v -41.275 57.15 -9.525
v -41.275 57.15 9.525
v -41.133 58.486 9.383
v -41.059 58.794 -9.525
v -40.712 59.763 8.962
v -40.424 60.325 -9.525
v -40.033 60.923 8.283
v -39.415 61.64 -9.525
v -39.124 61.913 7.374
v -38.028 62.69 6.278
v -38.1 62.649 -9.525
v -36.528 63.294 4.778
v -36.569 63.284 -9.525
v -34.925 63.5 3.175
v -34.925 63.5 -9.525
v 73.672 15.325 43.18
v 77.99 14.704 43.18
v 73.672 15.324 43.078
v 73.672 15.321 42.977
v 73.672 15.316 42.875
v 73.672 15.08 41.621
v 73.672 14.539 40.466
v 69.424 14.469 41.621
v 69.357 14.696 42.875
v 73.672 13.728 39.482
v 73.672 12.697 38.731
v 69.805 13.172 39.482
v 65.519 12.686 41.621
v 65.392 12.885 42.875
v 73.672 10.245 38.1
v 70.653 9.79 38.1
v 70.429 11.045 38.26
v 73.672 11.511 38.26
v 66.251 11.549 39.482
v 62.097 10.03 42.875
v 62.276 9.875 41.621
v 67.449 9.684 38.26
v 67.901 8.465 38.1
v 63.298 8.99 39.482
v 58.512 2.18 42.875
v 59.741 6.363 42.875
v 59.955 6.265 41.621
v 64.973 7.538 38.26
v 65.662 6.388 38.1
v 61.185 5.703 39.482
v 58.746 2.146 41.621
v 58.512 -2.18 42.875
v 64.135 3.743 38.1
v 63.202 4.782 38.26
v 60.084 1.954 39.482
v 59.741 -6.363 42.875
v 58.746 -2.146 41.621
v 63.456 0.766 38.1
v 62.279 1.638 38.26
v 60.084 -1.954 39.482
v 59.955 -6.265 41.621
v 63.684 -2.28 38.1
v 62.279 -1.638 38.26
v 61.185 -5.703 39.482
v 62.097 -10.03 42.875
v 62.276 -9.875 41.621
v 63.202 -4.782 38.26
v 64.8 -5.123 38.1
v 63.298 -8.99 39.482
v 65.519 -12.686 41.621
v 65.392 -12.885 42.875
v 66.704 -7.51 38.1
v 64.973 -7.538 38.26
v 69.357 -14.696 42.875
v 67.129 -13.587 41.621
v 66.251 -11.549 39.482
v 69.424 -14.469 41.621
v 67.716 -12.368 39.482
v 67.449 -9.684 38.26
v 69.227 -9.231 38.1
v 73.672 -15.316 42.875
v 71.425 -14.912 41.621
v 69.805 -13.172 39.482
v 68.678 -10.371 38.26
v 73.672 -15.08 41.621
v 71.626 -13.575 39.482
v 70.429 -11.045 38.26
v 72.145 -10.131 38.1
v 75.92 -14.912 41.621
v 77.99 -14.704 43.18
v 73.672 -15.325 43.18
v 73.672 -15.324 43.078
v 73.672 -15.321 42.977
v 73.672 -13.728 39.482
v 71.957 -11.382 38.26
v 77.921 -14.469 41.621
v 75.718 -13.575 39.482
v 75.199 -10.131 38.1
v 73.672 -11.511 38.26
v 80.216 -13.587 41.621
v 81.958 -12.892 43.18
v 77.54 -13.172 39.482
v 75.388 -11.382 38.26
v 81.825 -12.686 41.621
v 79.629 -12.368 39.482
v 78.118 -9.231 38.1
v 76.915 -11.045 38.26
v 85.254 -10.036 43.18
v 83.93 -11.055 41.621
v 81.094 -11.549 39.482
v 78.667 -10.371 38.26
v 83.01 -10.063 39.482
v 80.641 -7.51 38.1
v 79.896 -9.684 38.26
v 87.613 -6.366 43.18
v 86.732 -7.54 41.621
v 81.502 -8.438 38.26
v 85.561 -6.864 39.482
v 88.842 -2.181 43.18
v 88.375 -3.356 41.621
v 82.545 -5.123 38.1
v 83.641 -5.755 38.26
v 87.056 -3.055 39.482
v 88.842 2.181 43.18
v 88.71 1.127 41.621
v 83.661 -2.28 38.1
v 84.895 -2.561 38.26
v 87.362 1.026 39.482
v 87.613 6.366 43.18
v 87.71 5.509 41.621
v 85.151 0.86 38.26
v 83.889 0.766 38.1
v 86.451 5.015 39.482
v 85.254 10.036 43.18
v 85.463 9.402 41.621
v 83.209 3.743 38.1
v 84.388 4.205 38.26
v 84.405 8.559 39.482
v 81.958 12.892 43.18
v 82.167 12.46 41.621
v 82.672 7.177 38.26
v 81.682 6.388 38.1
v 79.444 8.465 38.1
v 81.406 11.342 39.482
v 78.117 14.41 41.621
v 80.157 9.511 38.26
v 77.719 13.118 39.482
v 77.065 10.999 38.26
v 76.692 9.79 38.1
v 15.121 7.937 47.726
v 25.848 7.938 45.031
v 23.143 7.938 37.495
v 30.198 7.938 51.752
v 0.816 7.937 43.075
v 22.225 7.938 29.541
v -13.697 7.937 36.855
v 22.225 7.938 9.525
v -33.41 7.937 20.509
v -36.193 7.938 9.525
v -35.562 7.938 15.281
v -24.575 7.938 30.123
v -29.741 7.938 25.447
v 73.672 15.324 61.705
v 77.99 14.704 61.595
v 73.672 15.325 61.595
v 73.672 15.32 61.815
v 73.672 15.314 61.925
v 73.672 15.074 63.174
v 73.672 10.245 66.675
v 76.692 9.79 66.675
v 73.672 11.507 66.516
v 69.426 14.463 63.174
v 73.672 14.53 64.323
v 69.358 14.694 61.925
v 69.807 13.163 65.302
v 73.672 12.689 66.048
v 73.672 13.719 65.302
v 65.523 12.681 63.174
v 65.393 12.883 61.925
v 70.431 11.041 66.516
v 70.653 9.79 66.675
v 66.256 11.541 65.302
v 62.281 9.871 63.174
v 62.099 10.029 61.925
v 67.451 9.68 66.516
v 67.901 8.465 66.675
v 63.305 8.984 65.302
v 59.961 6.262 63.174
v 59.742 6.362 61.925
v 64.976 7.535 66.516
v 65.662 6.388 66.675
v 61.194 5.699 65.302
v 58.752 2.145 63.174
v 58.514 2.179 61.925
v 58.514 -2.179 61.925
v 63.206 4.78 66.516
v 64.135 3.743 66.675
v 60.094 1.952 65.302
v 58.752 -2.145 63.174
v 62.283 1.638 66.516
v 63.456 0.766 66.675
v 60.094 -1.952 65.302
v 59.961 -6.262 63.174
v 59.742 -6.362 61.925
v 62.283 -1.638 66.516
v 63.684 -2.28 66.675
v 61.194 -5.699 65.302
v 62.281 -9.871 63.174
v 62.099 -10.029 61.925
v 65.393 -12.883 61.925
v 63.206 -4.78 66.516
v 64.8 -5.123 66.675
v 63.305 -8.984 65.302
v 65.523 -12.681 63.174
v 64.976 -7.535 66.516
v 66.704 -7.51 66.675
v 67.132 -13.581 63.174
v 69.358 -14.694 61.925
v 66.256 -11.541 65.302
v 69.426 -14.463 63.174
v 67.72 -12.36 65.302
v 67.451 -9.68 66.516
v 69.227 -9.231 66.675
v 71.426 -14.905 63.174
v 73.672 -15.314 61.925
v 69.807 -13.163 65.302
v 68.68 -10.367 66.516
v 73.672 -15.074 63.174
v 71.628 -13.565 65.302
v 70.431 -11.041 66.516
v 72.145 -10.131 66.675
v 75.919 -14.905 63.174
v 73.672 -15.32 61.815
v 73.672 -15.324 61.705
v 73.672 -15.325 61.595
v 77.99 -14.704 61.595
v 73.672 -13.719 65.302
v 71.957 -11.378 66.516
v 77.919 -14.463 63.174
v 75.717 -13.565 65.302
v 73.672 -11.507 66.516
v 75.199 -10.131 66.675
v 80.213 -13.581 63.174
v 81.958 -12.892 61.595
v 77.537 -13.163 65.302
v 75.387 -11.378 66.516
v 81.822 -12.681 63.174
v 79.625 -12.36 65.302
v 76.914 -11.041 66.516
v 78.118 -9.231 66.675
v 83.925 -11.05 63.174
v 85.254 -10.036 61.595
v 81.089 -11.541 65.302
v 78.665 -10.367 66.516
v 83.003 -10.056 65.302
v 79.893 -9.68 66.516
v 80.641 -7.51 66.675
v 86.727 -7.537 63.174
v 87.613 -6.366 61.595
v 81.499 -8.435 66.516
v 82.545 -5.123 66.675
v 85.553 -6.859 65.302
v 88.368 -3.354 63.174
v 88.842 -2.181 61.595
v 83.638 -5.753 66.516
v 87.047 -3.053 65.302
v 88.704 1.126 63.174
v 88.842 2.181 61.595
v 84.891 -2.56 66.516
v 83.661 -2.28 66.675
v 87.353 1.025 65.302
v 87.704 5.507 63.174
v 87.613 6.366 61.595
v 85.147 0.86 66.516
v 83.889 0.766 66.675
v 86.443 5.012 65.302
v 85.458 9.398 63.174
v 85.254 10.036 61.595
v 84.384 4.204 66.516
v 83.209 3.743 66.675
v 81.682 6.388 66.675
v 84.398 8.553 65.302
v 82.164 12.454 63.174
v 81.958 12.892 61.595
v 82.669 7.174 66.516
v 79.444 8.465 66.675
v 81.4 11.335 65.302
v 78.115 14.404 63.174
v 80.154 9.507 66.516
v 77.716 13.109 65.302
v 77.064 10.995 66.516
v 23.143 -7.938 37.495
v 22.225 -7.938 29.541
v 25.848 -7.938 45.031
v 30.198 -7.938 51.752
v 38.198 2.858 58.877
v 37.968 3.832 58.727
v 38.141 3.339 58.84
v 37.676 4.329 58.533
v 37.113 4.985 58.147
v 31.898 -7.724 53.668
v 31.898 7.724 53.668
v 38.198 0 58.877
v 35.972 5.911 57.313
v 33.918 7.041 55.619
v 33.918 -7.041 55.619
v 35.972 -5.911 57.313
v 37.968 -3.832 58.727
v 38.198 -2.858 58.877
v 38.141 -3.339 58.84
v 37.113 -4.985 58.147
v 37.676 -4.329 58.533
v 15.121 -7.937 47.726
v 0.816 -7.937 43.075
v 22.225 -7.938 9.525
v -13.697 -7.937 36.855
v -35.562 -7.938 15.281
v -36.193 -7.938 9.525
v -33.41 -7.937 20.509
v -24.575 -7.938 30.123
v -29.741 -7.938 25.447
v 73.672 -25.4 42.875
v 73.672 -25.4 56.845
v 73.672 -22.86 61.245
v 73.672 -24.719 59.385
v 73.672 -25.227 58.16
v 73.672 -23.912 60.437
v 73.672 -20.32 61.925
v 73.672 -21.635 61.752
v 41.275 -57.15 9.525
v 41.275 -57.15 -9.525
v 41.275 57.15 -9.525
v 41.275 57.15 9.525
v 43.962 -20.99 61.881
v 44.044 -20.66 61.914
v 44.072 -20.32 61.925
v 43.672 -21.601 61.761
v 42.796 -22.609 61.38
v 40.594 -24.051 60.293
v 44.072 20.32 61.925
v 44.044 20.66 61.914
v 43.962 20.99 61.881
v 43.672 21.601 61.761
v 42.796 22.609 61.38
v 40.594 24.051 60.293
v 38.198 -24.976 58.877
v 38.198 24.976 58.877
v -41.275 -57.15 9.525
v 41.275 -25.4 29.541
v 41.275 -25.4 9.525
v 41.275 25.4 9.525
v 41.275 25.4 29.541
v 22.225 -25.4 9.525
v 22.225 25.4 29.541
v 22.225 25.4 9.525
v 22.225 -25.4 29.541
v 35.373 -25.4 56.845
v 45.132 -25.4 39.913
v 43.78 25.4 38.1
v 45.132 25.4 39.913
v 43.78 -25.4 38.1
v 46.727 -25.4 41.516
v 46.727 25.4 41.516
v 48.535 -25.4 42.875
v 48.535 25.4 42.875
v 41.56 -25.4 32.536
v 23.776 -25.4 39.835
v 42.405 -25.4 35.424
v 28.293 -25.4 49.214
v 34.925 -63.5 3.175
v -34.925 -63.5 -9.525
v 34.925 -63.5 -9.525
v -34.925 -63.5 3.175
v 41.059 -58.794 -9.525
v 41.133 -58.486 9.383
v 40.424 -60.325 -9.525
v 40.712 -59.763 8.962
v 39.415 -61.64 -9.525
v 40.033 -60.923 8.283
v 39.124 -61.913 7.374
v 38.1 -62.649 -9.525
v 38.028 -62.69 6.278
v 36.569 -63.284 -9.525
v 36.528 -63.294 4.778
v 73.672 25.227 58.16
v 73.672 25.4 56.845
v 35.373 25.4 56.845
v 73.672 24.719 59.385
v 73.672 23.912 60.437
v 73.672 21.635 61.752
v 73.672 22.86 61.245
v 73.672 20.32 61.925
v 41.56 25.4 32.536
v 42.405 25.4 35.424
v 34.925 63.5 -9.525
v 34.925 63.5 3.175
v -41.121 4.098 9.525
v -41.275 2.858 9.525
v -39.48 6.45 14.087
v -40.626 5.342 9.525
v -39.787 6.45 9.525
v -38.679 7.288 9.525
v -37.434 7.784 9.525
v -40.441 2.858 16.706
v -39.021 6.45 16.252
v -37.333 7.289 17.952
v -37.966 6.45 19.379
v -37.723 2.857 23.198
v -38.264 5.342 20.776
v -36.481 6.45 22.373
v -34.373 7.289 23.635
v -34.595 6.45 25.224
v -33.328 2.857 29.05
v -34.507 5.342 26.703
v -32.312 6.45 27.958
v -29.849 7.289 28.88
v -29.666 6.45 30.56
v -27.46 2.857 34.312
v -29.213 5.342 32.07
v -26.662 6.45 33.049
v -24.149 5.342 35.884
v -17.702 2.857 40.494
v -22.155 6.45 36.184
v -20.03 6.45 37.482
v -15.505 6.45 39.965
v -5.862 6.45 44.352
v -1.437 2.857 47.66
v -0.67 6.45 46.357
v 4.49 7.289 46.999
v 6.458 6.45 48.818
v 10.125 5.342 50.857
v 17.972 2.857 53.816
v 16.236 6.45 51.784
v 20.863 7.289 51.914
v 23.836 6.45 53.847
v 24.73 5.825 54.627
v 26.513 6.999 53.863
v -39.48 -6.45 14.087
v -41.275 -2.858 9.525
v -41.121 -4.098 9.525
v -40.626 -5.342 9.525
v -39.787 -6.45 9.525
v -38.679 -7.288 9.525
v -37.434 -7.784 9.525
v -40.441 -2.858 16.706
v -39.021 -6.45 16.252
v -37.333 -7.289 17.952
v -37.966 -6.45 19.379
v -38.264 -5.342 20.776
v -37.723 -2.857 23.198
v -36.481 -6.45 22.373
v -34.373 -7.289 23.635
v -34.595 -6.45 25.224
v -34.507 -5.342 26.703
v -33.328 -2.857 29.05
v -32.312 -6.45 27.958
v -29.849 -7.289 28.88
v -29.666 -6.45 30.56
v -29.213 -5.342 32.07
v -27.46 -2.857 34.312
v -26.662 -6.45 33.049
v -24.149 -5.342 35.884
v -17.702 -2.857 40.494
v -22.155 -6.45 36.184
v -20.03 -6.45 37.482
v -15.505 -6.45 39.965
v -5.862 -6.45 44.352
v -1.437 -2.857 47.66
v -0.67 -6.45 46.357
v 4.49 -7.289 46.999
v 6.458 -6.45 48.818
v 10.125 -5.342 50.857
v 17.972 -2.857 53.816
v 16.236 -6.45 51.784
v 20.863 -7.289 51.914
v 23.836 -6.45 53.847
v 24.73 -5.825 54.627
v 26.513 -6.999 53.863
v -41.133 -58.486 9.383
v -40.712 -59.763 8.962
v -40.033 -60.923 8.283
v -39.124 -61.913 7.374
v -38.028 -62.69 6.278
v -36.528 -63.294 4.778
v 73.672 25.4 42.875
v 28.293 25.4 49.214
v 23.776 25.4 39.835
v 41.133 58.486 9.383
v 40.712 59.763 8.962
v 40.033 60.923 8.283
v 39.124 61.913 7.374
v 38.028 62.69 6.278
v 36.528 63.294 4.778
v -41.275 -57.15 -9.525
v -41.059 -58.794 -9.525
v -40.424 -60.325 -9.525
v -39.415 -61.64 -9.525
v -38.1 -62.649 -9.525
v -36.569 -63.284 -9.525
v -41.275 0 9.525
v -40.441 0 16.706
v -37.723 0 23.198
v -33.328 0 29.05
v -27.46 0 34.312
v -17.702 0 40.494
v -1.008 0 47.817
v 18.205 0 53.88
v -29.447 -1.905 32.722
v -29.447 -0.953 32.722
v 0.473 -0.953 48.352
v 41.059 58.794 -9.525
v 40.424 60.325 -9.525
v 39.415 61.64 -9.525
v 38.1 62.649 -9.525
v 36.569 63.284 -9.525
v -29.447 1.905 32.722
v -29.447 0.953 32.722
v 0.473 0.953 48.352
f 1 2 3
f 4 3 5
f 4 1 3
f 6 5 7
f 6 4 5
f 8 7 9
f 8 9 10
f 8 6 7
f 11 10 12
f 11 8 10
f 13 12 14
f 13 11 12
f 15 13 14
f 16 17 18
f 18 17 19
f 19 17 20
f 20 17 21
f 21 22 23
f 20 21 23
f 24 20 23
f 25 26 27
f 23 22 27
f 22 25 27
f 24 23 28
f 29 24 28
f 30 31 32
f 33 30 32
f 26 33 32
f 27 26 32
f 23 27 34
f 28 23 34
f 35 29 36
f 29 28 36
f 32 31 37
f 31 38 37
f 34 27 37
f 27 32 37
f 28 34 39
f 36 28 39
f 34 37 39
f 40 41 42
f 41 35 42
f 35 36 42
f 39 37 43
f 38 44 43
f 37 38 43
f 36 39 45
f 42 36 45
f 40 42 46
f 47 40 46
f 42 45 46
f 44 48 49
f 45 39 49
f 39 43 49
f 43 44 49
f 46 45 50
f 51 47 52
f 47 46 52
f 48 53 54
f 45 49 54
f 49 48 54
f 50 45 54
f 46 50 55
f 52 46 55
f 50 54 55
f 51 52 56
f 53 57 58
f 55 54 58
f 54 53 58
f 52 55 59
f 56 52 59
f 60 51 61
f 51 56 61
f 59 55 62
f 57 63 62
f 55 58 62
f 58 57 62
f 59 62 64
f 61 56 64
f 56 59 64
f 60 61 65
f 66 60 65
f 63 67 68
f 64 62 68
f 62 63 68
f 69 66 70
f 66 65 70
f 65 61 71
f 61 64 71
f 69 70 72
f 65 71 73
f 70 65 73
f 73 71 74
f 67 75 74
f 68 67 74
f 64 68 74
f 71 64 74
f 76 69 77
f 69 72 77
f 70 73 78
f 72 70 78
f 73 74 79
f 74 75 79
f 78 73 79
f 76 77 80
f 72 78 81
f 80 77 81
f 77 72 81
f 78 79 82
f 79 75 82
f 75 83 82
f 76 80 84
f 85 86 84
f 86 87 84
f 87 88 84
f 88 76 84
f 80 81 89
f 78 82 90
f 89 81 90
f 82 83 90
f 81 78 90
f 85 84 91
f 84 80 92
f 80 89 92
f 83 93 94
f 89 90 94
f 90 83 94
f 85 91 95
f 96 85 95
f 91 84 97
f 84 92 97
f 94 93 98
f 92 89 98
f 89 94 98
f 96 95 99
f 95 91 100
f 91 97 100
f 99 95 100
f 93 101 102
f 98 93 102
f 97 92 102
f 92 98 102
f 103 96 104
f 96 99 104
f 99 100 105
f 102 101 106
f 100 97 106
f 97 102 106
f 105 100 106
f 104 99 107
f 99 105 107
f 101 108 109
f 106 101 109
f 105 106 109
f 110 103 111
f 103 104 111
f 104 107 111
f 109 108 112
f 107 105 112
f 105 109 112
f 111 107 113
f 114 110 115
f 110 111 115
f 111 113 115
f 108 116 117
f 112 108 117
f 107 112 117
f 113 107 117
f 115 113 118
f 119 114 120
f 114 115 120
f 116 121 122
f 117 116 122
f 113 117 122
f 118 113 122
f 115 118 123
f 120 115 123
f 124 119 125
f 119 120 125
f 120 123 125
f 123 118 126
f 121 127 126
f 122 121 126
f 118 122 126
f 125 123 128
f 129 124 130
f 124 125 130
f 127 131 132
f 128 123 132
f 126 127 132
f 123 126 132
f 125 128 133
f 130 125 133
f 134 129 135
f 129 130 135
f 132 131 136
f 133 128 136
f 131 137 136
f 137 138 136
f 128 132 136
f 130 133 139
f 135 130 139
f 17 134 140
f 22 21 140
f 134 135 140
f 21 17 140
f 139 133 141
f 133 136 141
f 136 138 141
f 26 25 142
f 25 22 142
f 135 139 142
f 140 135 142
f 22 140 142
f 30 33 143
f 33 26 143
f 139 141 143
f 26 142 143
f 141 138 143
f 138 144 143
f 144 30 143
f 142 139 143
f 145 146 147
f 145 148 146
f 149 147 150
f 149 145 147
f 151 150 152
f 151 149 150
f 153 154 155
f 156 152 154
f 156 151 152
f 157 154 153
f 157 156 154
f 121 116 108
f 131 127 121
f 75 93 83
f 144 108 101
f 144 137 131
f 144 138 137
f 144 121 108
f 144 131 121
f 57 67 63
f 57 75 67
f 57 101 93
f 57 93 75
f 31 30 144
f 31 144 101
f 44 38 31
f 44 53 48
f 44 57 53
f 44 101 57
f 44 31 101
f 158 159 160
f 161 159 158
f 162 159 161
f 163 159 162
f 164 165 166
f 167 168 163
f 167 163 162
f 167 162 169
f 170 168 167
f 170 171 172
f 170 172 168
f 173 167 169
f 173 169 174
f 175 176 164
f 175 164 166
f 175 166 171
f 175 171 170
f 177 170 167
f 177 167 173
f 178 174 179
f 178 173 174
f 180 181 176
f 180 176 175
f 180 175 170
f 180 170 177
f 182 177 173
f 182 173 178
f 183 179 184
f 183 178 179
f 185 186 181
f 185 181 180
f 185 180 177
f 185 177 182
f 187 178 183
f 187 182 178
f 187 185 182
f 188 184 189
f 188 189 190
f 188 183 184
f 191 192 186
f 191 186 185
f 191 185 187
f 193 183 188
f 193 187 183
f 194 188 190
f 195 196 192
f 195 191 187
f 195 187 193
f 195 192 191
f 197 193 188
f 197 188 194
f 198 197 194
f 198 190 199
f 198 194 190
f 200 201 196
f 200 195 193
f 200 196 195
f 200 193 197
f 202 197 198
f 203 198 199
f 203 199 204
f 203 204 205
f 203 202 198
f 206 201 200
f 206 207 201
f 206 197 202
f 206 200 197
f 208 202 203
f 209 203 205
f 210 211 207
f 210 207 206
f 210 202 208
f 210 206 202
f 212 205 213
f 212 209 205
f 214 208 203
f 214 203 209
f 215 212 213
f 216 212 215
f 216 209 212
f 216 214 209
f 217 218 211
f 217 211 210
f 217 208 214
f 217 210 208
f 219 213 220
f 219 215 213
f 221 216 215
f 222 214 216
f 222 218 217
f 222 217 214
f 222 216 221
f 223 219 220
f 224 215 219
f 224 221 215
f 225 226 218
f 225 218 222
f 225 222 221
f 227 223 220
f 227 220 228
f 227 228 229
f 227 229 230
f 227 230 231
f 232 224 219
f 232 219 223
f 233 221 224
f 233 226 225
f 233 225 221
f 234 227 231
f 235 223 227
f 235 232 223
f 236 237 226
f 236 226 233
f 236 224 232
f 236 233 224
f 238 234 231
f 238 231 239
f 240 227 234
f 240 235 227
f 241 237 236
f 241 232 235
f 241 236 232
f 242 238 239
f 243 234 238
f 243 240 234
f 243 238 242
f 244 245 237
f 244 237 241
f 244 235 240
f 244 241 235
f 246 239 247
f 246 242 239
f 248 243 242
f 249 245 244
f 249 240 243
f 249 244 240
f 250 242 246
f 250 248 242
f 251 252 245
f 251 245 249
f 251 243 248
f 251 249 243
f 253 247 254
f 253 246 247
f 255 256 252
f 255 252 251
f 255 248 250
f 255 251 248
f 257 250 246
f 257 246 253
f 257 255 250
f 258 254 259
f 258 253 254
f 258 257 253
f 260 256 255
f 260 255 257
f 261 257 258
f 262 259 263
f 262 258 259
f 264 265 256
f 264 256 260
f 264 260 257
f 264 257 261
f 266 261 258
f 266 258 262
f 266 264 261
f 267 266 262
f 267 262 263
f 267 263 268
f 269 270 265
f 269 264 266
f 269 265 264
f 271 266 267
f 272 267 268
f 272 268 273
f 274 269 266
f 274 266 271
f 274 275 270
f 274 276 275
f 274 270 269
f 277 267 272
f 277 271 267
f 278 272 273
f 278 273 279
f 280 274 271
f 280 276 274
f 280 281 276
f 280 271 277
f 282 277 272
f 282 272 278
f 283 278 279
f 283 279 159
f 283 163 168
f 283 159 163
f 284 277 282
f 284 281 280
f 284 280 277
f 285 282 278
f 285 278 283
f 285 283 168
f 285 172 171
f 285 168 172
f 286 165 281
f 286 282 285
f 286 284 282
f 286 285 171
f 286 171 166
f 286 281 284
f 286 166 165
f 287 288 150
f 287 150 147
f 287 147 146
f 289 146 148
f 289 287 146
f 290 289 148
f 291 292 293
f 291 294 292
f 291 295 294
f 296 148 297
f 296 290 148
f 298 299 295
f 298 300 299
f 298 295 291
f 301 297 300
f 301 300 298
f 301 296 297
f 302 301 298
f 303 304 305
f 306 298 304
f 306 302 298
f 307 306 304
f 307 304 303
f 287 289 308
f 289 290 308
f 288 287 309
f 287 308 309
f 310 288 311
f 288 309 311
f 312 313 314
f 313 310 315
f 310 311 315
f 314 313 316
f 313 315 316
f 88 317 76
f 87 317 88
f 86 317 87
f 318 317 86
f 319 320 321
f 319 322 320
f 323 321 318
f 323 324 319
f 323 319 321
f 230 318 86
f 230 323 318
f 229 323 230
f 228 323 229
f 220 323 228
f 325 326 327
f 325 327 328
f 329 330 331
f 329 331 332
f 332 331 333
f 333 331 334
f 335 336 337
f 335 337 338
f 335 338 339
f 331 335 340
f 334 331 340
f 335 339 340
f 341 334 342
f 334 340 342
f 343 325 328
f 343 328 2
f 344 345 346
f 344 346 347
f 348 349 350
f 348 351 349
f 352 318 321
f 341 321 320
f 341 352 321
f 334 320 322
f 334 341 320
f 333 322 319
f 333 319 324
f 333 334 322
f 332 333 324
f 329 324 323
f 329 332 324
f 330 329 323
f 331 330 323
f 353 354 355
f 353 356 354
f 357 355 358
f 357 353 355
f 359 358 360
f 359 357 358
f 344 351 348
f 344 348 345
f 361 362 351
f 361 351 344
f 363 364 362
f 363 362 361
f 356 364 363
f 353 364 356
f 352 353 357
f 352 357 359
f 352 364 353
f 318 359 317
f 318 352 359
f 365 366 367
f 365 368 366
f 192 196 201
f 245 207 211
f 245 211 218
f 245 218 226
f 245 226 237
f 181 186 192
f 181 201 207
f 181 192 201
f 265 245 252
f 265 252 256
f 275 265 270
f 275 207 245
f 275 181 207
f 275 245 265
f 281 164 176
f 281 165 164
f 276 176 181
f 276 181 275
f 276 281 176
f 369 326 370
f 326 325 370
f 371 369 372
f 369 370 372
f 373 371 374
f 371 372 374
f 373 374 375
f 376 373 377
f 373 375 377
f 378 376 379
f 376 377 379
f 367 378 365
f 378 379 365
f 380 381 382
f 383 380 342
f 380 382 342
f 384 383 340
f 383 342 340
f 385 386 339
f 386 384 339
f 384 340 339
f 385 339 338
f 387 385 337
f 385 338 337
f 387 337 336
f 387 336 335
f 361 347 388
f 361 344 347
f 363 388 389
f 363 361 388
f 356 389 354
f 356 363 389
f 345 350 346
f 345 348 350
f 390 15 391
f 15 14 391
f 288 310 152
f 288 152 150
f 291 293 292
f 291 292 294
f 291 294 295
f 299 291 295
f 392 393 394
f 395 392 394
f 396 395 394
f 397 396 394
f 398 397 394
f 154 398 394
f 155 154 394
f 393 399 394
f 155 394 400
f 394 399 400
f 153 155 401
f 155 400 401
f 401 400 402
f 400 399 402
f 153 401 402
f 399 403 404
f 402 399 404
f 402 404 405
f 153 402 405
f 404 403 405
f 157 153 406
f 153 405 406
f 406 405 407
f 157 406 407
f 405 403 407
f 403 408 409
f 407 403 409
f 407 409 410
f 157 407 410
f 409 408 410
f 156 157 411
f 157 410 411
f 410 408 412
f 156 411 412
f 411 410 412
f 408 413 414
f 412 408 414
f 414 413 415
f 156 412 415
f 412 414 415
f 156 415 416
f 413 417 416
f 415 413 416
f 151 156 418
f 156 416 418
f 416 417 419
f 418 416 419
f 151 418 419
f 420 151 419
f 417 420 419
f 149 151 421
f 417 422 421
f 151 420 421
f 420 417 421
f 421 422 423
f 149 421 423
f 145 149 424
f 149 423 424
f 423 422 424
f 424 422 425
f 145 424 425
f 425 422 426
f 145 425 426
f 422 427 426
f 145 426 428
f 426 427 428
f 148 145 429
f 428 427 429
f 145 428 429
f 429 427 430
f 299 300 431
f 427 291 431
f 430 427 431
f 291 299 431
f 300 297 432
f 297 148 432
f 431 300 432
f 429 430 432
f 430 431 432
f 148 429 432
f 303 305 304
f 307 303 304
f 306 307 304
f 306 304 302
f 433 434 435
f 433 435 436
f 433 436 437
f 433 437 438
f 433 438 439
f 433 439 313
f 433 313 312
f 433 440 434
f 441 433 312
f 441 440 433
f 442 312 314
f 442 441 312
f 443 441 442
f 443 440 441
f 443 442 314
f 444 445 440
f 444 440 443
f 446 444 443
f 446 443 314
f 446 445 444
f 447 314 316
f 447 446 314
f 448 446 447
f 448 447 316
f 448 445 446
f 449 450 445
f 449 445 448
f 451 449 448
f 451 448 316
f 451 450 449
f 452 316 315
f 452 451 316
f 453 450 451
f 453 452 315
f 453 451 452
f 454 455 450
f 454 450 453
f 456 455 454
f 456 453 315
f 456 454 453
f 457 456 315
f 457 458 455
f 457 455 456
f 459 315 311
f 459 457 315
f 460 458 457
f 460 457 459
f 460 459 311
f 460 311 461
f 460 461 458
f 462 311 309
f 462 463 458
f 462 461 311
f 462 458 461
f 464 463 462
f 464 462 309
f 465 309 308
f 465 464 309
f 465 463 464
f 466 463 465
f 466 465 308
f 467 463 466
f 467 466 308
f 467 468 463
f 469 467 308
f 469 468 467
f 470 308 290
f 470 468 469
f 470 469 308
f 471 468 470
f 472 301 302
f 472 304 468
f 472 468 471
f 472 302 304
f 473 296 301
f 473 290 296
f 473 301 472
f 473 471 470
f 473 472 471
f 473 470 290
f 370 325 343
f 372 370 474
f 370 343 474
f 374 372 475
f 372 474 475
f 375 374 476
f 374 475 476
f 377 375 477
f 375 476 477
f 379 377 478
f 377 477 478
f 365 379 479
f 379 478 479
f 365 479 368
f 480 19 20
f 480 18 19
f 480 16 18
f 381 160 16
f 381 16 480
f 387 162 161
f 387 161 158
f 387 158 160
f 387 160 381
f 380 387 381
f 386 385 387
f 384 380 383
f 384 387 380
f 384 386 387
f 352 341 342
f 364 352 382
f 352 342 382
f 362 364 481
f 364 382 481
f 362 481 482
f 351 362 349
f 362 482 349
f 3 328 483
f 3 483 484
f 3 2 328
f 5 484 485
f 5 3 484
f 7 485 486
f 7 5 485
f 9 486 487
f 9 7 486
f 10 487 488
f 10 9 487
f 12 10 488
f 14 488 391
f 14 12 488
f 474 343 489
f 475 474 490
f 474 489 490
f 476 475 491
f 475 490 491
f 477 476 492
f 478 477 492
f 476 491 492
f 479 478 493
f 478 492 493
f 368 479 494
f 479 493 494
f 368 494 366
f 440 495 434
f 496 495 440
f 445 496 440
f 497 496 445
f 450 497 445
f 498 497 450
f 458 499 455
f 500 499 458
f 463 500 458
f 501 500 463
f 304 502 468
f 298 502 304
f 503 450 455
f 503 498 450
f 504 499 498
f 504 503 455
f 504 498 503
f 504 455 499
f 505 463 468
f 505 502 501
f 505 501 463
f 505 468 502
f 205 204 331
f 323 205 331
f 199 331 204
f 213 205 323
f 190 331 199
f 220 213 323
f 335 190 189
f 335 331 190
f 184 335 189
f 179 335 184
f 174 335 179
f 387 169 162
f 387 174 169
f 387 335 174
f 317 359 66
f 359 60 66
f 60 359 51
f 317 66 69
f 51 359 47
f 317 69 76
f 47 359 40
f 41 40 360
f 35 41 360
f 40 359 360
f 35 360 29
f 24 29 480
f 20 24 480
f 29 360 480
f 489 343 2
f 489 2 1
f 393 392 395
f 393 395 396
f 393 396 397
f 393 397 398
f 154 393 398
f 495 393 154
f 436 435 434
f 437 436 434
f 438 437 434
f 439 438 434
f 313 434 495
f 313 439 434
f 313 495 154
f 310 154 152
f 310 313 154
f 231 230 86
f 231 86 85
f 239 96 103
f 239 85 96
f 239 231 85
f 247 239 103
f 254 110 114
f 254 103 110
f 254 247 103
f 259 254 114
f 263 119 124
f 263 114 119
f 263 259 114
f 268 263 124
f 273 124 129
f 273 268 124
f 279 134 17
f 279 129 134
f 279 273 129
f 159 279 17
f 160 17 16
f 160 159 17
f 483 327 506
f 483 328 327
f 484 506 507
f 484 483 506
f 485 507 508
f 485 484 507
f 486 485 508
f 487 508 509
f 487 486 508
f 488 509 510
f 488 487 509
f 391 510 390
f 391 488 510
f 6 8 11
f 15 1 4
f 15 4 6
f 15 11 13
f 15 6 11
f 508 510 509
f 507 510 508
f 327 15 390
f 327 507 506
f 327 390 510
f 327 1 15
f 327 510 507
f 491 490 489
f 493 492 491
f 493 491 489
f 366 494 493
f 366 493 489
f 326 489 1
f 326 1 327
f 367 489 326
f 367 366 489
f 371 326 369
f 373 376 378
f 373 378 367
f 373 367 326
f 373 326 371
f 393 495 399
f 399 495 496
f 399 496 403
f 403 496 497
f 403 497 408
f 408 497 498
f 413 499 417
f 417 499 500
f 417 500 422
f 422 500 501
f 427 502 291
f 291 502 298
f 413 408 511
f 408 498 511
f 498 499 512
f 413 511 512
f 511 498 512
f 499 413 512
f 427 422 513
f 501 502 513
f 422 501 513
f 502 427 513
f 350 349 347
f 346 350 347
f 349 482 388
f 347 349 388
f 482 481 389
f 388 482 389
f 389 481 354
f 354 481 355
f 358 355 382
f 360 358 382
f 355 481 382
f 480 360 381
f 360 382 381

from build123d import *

# Parameters (mm, degrees)
F1_DEPTH    = 63.5
F2_DEPTH    = 7.9375
F3_DEPTH    = 25.4
F5_R        = 6.35
F6_T1_DEPTH = 55.0007445182
F6_2_F1_R   = 5.08
F6_2_F2_R   = 5.08


# Not quite as in the source:
# - a fillet or chamfer that OpenCascade refuses, or shapes differently, is made with other operations: its cross-section is extruded or revolved along the edge and cut away or added


with BuildPart() as f1:
    # F0 (on Front) → F1 (new body, symmetric)
    with BuildSketch(Plane.XZ):
        Polygon((-41.275, 9.525), (-41.275, -9.525), (41.275, -9.525), (41.275, 9.525), (22.225, 9.525), align=None)
    extrude(amount=F1_DEPTH, both=True)

    # F5
    f5_edges = [f1.edges().sort_by_distance(p)[0] for p in [
        (-41.275, -63.5, 0),
        (41.275, -63.5, 0),
        (41.275, 63.5, 0),
        (-41.275, 63.5, 0),
        (0, 63.5, 9.525),
        (0, -63.5, 9.525),
    ]]
    fillet(f5_edges, radius=F5_R)


with BuildPart() as f2:
    # F0 (on Front) → F2 (new body, symmetric)
    with BuildSketch(Plane.XZ):
        with BuildLine():
            add(Edge.make_bspline(
                [(-41.275, 9.525), (-41.9218663516, 37.3261011822), (0, 50.0849671662), (38.1976362328, 58.8767082382)],
                knots=[0, 0, 0, 0, 93.5494041446, 93.5494041446, 93.5494041446, 93.5494041446], degree=3))
            Line((-41.275, 9.525), (22.225, 9.525))
            Line((22.225, 9.525), (22.225, 29.5413450627))
            ThreePointArc((22.225, 29.5413450627), (26.4769912662, 46.2423079157), (38.1976362328, 58.8767082382))
        make_face()
    extrude(amount=F2_DEPTH, both=True)

    # F6#2: fillet of radius 5.08 on 2 edges, made by hand

    # F6_2_f1
    f6_2_f1_edges = [f2.edges().sort_by_distance(p)[0] for p in [
        (-16.1053703527, 7.9375, 41.3293641604),
    ]]
    fillet(f6_2_f1_edges, radius=F6_2_F1_R)

    # F6_2_f2
    f6_2_f2_edges = [f2.edges().sort_by_distance(p)[0] for p in [
        (-16.1053703527, -7.9375, 41.3293641604),
    ]]
    fillet(f6_2_f2_edges, radius=F6_2_F2_R)


with BuildPart() as f3:
    # F0 (on Front) → F3 (new body, symmetric)
    with BuildSketch(Plane.XZ):
        with BuildLine():
            Line((22.225, 9.525), (41.275, 9.525))
            Line((41.275, 9.525), (41.275, 29.5413450627))
            ThreePointArc((41.275, 29.5413450627), (41.9140357405, 34.0001585915), (43.7796951918, 38.1))
            Line((43.7796951918, 38.1), (38.1976362328, 38.1))
            Line((38.1976362328, 38.1), (38.1976362328, 58.8767082382))
            ThreePointArc((38.1976362328, 58.8767082382), (26.4769912662, 46.2423079157), (22.225, 29.5413450627))
            Line((22.225, 29.5413450627), (22.225, 9.525))
        make_face()
        with BuildLine():
            ThreePointArc((44.0717140113, 61.9252), (41.0623041907, 60.5404042186), (38.1976362328, 58.8767082382))
            Line((38.1976362328, 58.8767082382), (38.1976362328, 38.1))
            Line((38.1976362328, 38.1), (43.7796951918, 38.1))
            ThreePointArc((43.7796951918, 38.1), (45.9008806945, 40.7428154953), (48.5346684619, 42.8752))
            Line((48.5346684619, 42.8752), (73.6724585295, 42.8752))
            Line((73.6724585295, 42.8752), (73.6724585295, 61.9252))
            Line((73.6724585295, 61.9252), (44.0717140113, 61.9252))
        make_face()
    extrude(amount=F3_DEPTH, both=True)

    # F0 (on Front) → F4 (revolve)
    with BuildSketch(Plane.XZ):
        Polygon((88.9976362328, 66.675), (73.6724585295, 66.675), (73.6724585295, 61.9252), (73.6724585295, 42.8752), (73.6724585295, 38.1), (88.9976362328, 38.1), align=None)
    revolve(axis=Axis((73.6724585295, 0, 52.3875), (0, 0, 1)))

    # F6: fillet of radius 5.08 on 4 edges, made by hand

    # F6_s2 → F6_t1 (cut)
    with BuildSketch(Plane.YZ.offset(31.3717140113)):
        with BuildLine():
            ThreePointArc((-25.4, 56.8452), (-23.9121024484, 60.4373024484), (-20.32, 61.9252))
            Line((-20.32, 61.9252), (-25.4, 61.9252))
            Line((-25.4, 61.9252), (-25.4, 56.8452))
        make_face()
        with BuildLine():
            ThreePointArc((25.4, 56.8452), (23.9121024484, 60.4373024484), (20.32, 61.9252))
            Line((20.32, 61.9252), (25.4, 61.9252))
            Line((25.4, 61.9252), (25.4, 56.8452))
        make_face()
    extrude(amount=F6_T1_DEPTH, mode=Mode.SUBTRACT)


with BuildPart() as f6_tool4:
    # F6_s5 → F6_t6 (revolve)
    with BuildSketch(Plane.XZ):
        with BuildLine():
            ThreePointArc((88.9976362328, 43.18), (87.5097386812, 39.5878975516), (83.9176362328, 38.1))
            Line((83.9176362328, 38.1), (88.9976362328, 38.1))
            Line((88.9976362328, 38.1), (88.9976362328, 43.18))
        make_face()
    revolve(axis=Axis((73.6724585295, 0, 38.1), (0, 0, 1)))

    split(bisect_by=Plane.XY.offset(42.8752), keep=Keep.TOP)

    split(bisect_by=Plane.YZ.offset(73.6724585295), keep=Keep.TOP)


with BuildPart() as f3_1:
    add(f3.part)

    # F6_t3: cut F6_tool4
    add(f6_tool4.part, mode=Mode.SUBTRACT)


with BuildPart() as f6_tool10:
    # F6_s11 → F6_t12 (revolve)
    with BuildSketch(Plane.XZ):
        with BuildLine():
            ThreePointArc((88.9976362328, 43.18), (87.5097386812, 39.5878975516), (83.9176362328, 38.1))
            Line((83.9176362328, 38.1), (88.9976362328, 38.1))
            Line((88.9976362328, 38.1), (88.9976362328, 43.18))
        make_face()
    revolve(axis=Axis((73.6724585295, 0, 38.1), (0, 0, 1)))

    split(bisect_by=Plane.XY.offset(42.8752), keep=Keep.BOTTOM)

    split(bisect_by=Plane.YZ.offset(73.6724585295), keep=Keep.TOP)


with BuildPart() as f3_2:
    add(f3_1.part)

    # F6_t9: cut F6_tool10
    add(f6_tool10.part, mode=Mode.SUBTRACT)


with BuildPart() as f6_tool16:
    # F6_s17 → F6_t18 (revolve)
    with BuildSketch(Plane.XZ):
        with BuildLine():
            ThreePointArc((88.9976362328, 43.18), (87.5097386812, 39.5878975516), (83.9176362328, 38.1))
            Line((83.9176362328, 38.1), (88.9976362328, 38.1))
            Line((88.9976362328, 38.1), (88.9976362328, 43.18))
        make_face()
    revolve(axis=Axis((73.6724585295, 0, 38.1), (0, 0, 1)))

    split(bisect_by=Plane.XY.offset(42.8752), keep=Keep.BOTTOM)

    split(bisect_by=Plane.YZ.offset(73.6724585295), keep=Keep.BOTTOM)


with BuildPart() as f3_3:
    add(f3_2.part)

    # F6_t15: cut F6_tool16
    add(f6_tool16.part, mode=Mode.SUBTRACT)


with BuildPart() as f6_tool22:
    # F6_s23 → F6_t24 (revolve)
    with BuildSketch(Plane.XZ):
        with BuildLine():
            ThreePointArc((88.9976362328, 61.595), (87.5097386812, 65.1871024484), (83.9176362328, 66.675))
            Line((83.9176362328, 66.675), (88.9976362328, 66.675))
            Line((88.9976362328, 66.675), (88.9976362328, 61.595))
        make_face()
    revolve(axis=Axis((73.6724585295, 0, 66.675), (0, 0, 1)))

    split(bisect_by=Plane.YZ.offset(73.6724585295), keep=Keep.TOP)

    split(bisect_by=Plane.XY.offset(61.9252), keep=Keep.BOTTOM)


with BuildPart() as f3_4:
    add(f3_3.part)

    # F6_t21: cut F6_tool22
    add(f6_tool22.part, mode=Mode.SUBTRACT)


with BuildPart() as f6_tool28:
    # F6_s29 → F6_t30 (revolve)
    with BuildSketch(Plane.XZ):
        with BuildLine():
            ThreePointArc((88.9976362328, 61.595), (87.5097386812, 65.1871024484), (83.9176362328, 66.675))
            Line((83.9176362328, 66.675), (88.9976362328, 66.675))
            Line((88.9976362328, 66.675), (88.9976362328, 61.595))
        make_face()
    revolve(axis=Axis((73.6724585295, 0, 66.675), (0, 0, 1)))

    split(bisect_by=Plane.YZ.offset(73.6724585295), keep=Keep.TOP)

    split(bisect_by=Plane.XY.offset(61.9252), keep=Keep.TOP)


with BuildPart() as f3_5:
    add(f3_4.part)

    # F6_t27: cut F6_tool28
    add(f6_tool28.part, mode=Mode.SUBTRACT)


with BuildPart() as f6_tool34:
    # F6_s35 → F6_t36 (revolve)
    with BuildSketch(Plane.XZ):
        with BuildLine():
            ThreePointArc((88.9976362328, 61.595), (87.5097386812, 65.1871024484), (83.9176362328, 66.675))
            Line((83.9176362328, 66.675), (88.9976362328, 66.675))
            Line((88.9976362328, 66.675), (88.9976362328, 61.595))
        make_face()
    revolve(axis=Axis((73.6724585295, 0, 66.675), (0, 0, 1)))

    split(bisect_by=Plane.YZ.offset(73.6724585295), keep=Keep.BOTTOM)

    split(bisect_by=Plane.XY.offset(61.9252), keep=Keep.TOP)


with BuildPart() as f3_6:
    add(f3_5.part)

    # F6_t33: cut F6_tool34
    add(f6_tool34.part, mode=Mode.SUBTRACT)


solid = Compound([f1.part, f2.part, f3_6.part])
